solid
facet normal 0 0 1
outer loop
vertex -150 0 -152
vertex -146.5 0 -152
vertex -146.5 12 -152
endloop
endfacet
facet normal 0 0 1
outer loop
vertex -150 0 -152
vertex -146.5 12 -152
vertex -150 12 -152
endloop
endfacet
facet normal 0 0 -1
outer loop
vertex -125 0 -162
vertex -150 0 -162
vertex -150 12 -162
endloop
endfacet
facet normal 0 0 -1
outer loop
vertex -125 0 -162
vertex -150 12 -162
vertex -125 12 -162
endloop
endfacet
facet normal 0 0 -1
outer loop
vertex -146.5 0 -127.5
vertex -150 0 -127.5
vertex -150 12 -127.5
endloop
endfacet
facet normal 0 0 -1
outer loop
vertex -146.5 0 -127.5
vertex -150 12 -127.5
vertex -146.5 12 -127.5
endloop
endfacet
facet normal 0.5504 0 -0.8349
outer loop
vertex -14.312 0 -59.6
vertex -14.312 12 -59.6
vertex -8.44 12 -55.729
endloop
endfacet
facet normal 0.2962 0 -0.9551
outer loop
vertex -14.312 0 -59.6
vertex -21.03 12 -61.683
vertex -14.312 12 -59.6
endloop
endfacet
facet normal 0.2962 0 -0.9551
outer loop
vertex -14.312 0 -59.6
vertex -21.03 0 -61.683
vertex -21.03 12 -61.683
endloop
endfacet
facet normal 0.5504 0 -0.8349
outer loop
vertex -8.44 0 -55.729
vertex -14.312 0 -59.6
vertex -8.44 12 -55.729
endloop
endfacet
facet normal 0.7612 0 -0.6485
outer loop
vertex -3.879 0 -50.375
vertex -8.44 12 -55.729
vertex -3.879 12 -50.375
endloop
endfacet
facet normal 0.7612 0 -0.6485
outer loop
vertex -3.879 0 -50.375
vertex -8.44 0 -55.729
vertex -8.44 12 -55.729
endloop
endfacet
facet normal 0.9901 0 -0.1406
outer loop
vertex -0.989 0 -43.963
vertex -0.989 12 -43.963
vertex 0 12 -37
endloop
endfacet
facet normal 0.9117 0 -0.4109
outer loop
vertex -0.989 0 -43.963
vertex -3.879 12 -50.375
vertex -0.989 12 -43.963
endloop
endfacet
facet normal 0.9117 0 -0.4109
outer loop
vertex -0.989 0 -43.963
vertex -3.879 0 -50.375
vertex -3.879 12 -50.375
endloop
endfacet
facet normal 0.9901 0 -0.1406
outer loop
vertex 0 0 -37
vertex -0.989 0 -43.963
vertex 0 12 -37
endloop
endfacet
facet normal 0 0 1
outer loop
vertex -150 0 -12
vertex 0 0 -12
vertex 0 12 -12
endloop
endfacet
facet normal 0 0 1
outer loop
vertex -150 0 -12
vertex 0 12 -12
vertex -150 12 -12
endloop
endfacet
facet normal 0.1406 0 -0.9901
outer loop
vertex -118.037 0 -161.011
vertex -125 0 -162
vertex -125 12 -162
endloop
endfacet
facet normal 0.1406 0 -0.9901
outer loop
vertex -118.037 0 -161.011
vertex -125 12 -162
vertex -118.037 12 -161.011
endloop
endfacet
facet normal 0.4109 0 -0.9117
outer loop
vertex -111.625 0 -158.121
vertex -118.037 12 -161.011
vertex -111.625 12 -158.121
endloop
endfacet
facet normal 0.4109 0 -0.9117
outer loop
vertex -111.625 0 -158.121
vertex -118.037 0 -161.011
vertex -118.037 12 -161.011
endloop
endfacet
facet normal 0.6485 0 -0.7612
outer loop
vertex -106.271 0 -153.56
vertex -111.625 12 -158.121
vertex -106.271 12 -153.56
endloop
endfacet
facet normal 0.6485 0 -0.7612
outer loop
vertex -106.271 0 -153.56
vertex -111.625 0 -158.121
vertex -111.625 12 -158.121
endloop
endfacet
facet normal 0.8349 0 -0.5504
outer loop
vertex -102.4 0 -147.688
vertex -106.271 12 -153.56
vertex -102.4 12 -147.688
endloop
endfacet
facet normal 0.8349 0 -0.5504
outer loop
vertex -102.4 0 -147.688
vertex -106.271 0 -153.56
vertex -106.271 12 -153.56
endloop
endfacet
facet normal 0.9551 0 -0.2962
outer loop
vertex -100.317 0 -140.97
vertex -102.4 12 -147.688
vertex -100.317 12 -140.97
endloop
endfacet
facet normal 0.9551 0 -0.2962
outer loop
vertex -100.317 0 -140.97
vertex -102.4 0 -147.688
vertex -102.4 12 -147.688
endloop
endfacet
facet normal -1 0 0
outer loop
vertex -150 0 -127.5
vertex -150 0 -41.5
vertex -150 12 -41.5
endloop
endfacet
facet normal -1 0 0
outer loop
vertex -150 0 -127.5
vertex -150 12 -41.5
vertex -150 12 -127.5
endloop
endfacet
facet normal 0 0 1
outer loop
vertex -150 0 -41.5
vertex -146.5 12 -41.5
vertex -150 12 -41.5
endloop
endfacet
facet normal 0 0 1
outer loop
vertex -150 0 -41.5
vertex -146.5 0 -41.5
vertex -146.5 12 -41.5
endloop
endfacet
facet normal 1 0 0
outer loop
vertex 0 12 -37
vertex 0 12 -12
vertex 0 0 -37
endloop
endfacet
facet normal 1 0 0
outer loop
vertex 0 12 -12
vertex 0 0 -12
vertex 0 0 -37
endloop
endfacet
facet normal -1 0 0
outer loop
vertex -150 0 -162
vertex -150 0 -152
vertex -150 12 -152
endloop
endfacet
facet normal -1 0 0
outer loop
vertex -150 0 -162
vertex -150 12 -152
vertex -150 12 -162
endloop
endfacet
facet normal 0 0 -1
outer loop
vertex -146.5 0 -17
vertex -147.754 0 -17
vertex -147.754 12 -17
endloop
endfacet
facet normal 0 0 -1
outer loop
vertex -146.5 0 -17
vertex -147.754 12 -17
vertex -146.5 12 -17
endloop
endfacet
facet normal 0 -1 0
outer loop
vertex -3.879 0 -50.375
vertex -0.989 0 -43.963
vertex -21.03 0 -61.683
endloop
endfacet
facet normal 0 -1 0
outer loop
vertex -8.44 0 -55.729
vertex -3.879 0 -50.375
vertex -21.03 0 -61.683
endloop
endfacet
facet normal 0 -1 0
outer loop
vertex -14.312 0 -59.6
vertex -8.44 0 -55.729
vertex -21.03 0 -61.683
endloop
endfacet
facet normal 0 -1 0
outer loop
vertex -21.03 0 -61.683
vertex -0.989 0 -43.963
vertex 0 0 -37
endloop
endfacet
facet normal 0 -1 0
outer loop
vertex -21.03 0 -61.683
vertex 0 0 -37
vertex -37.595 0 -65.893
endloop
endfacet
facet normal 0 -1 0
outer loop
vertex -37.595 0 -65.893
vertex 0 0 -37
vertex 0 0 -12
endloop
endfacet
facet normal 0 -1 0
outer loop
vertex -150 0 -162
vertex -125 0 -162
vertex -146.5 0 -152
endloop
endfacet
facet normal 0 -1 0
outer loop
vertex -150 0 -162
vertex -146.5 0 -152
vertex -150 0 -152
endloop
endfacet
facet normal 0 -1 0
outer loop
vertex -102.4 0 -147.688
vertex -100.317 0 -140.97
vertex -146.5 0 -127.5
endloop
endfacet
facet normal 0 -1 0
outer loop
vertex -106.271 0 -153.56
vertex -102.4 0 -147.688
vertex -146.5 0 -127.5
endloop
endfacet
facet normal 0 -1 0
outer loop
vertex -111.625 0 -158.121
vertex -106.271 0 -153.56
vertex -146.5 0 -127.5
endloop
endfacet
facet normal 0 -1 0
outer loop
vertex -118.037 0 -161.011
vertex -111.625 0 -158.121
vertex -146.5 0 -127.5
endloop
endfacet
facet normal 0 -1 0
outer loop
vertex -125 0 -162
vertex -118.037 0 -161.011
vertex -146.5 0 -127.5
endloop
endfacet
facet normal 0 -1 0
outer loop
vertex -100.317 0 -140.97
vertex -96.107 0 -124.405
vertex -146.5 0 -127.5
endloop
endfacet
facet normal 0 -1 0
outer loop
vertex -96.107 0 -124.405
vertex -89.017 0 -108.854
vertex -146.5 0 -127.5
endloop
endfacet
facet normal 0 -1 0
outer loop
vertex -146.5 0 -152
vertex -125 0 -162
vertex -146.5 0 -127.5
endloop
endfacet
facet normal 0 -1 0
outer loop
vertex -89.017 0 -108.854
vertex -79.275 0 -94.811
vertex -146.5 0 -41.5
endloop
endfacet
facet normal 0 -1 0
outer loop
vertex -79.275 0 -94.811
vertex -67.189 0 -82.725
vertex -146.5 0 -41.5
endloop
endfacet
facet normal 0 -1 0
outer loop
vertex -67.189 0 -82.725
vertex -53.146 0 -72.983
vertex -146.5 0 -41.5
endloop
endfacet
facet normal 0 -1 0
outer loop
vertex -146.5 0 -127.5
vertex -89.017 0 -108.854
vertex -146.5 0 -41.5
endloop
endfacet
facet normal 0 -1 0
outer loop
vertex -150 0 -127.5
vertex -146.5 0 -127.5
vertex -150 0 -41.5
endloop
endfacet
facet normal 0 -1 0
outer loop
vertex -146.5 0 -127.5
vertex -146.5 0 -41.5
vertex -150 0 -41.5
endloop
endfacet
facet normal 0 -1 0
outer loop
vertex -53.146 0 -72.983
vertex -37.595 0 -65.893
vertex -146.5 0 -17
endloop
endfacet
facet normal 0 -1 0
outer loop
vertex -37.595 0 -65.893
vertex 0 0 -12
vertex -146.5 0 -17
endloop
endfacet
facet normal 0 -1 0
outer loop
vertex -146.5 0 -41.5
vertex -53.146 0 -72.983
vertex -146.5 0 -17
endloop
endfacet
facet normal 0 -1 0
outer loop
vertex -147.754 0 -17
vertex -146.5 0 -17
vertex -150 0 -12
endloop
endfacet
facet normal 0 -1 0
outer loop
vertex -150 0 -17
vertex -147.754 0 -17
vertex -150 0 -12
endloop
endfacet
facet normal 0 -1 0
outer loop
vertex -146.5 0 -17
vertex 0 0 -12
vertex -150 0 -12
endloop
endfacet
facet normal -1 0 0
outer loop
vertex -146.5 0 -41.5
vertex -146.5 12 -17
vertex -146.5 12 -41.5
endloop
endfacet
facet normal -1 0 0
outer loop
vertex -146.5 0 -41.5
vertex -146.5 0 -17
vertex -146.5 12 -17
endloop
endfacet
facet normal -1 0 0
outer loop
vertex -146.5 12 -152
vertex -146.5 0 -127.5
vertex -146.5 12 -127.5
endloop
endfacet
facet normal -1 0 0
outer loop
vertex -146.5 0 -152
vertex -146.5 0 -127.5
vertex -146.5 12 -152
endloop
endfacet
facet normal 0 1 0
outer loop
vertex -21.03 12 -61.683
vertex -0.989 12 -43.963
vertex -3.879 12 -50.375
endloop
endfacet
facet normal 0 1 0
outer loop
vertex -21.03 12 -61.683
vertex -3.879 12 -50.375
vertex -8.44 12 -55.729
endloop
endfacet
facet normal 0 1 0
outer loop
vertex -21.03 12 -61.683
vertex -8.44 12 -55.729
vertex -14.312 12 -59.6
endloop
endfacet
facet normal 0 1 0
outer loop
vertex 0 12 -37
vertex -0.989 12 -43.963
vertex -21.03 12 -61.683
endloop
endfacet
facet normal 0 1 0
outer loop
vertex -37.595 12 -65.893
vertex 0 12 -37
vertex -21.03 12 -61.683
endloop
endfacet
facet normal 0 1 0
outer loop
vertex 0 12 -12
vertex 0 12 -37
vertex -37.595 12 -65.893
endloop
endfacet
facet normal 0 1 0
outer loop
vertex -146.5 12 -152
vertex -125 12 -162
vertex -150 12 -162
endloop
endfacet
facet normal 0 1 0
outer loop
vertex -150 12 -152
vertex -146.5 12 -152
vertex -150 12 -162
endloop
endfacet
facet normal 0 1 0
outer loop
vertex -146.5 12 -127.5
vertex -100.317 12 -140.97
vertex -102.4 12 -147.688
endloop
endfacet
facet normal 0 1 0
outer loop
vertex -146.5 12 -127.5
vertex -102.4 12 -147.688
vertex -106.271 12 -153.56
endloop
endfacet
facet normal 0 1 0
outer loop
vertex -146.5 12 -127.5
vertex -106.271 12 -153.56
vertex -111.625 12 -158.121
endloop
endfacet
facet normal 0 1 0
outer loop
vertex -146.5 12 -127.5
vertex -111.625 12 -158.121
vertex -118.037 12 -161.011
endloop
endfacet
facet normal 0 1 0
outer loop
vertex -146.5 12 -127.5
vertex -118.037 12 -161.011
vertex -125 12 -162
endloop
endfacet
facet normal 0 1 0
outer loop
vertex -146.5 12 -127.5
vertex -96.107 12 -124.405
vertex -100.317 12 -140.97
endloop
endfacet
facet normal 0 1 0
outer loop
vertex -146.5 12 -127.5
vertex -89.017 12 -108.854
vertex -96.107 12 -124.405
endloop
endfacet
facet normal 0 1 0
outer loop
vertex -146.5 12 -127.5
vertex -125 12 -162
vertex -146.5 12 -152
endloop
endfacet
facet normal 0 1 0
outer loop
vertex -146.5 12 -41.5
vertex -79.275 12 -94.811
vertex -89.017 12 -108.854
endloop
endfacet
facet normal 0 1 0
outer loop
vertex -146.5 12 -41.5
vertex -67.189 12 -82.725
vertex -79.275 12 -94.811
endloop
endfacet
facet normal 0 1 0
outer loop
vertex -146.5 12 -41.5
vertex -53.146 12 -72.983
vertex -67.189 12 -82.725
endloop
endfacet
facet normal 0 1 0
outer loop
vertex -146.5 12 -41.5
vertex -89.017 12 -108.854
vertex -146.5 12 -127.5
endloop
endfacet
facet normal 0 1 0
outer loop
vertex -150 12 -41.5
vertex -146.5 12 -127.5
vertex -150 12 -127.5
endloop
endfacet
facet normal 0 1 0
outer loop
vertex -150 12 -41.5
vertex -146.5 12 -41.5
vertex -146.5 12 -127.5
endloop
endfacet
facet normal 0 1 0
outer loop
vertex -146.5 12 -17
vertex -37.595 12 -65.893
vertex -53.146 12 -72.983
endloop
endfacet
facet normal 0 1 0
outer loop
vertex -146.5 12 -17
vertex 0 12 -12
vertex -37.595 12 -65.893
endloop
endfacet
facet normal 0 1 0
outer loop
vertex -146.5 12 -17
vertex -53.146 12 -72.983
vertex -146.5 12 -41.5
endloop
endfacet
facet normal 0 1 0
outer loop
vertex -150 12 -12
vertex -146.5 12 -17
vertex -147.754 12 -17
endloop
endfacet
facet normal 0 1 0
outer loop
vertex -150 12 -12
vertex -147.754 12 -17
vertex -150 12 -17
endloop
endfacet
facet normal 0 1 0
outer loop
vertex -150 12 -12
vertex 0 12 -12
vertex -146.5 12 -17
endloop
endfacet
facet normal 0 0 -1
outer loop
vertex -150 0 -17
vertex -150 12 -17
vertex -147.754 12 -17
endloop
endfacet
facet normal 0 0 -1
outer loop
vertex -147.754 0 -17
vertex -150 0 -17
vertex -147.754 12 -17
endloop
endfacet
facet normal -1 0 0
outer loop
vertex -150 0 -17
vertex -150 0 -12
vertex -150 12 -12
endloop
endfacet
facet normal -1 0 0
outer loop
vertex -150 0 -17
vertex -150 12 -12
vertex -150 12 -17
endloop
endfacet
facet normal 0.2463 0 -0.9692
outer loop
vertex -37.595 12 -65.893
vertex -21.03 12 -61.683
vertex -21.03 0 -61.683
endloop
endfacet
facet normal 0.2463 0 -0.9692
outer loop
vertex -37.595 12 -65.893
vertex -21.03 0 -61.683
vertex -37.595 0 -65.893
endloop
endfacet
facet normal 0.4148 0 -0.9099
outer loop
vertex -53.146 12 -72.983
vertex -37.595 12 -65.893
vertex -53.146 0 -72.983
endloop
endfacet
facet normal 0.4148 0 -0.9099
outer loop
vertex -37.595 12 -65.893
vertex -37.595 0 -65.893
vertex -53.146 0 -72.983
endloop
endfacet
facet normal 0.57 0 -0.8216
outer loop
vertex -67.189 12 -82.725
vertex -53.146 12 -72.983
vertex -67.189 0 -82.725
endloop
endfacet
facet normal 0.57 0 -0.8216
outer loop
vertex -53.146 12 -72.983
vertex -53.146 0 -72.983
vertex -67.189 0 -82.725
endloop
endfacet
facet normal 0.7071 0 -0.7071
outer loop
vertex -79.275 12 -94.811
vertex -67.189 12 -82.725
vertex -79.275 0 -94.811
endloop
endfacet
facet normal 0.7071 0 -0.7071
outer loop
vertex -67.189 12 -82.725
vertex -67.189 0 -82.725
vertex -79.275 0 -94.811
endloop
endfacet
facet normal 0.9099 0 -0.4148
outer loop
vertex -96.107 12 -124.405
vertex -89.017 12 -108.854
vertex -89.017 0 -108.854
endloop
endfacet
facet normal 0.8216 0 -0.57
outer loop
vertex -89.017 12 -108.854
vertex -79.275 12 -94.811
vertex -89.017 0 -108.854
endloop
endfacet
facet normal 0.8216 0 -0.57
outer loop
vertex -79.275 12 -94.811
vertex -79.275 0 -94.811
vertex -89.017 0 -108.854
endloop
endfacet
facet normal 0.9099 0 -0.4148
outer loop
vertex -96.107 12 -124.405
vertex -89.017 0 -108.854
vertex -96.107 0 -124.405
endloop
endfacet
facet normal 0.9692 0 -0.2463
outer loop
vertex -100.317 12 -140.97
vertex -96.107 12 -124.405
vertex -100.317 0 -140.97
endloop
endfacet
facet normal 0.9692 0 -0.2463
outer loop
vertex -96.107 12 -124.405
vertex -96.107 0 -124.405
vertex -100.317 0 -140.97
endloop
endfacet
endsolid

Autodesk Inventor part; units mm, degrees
ref_plane "YZ Plane" through (0, 0, 0) normal (1, 0, 0) x (0, 1, 0)
ref_plane "XZ Plane" through (0, 0, 0) normal (0, 1, 0) x (-1, 0, 0)
ref_plane "XY Plane" through (0, 0, 0) normal (0, 0, 1) x (1, 0, 0)
sketch "Sketch1" plane through (0, 0, 0) normal (0, 1, 0) x (-1, 0, 0)
  line L0 (0, -12) -> (150, -12)
  line L1 (150, -12) -> (-170, -12)
  line L2 (150, -12) -> (150, 0)
  line L3 (-170, 0) -> (150, 0)
  line L4 (-170, -12) -> (-170, 0)
  arc A0 (0, -37) -> (21.03, -61.6828) centre (25, -37) ccw
  line L5 (0, -12) -> (0, -37)
  arc A1 (100.3172, -140.97) -> (125, -162) centre (125, -137) ccw
  line L6 (150, -162) -> (125, -162)
  arc A2 (100.3172, -140.97) -> (21.03, -61.6828) centre (5.8332, -156.1668) ccw
  line L7 (150, -17) -> (146.5, -17)
  line L8 (146.5, -17) -> (146.5, -41.5)
  line L9 (146.5, -41.5) -> (150, -41.5)
  line L10 (150, -127.5) -> (146.5, -127.5)
  line L11 (146.5, -127.5) -> (146.5, -152)
  line L12 (146.5, -152) -> (150, -152)
  line L13 (150, -12) -> (150, -17)
  line L14 (150, -41.5) -> (150, -127.5)
  line L15 (150, -152) -> (150, -162)
  line L16 (162.5, -20.3274) -> (147.5, -20.3274)
  line L17 (147.5, -37.698) -> (162.5, -37.698)
  line L18 (147.5, -40.746) -> (162.5, -40.746)
  line L19 (162.246, -41) -> (147.754, -41)
  line L20 (147.754, -17) -> (162.246, -17)
  line L21 (162.5, -17.254) -> (147.5, -17.254)
  line L22 (147.5, -20.3274) -> (147.5, -37.698) construction
  point P0 (0, 0)
extrude "Tykkelse af plade" add sketch "Sketch1" along normal blind 12 contours L0 L13 L7 L8 L9 L14 L10 L11 L12 L15 L6 A1 A2 A0 L5
equation "\"d12\" = d9"
equation "\"d13\" = d16"
equation "\"d9\" = 24.5"
equation "\"d16\" = 3.5"
properties part number "Z Holdere" material "Wood (Cherry)"
